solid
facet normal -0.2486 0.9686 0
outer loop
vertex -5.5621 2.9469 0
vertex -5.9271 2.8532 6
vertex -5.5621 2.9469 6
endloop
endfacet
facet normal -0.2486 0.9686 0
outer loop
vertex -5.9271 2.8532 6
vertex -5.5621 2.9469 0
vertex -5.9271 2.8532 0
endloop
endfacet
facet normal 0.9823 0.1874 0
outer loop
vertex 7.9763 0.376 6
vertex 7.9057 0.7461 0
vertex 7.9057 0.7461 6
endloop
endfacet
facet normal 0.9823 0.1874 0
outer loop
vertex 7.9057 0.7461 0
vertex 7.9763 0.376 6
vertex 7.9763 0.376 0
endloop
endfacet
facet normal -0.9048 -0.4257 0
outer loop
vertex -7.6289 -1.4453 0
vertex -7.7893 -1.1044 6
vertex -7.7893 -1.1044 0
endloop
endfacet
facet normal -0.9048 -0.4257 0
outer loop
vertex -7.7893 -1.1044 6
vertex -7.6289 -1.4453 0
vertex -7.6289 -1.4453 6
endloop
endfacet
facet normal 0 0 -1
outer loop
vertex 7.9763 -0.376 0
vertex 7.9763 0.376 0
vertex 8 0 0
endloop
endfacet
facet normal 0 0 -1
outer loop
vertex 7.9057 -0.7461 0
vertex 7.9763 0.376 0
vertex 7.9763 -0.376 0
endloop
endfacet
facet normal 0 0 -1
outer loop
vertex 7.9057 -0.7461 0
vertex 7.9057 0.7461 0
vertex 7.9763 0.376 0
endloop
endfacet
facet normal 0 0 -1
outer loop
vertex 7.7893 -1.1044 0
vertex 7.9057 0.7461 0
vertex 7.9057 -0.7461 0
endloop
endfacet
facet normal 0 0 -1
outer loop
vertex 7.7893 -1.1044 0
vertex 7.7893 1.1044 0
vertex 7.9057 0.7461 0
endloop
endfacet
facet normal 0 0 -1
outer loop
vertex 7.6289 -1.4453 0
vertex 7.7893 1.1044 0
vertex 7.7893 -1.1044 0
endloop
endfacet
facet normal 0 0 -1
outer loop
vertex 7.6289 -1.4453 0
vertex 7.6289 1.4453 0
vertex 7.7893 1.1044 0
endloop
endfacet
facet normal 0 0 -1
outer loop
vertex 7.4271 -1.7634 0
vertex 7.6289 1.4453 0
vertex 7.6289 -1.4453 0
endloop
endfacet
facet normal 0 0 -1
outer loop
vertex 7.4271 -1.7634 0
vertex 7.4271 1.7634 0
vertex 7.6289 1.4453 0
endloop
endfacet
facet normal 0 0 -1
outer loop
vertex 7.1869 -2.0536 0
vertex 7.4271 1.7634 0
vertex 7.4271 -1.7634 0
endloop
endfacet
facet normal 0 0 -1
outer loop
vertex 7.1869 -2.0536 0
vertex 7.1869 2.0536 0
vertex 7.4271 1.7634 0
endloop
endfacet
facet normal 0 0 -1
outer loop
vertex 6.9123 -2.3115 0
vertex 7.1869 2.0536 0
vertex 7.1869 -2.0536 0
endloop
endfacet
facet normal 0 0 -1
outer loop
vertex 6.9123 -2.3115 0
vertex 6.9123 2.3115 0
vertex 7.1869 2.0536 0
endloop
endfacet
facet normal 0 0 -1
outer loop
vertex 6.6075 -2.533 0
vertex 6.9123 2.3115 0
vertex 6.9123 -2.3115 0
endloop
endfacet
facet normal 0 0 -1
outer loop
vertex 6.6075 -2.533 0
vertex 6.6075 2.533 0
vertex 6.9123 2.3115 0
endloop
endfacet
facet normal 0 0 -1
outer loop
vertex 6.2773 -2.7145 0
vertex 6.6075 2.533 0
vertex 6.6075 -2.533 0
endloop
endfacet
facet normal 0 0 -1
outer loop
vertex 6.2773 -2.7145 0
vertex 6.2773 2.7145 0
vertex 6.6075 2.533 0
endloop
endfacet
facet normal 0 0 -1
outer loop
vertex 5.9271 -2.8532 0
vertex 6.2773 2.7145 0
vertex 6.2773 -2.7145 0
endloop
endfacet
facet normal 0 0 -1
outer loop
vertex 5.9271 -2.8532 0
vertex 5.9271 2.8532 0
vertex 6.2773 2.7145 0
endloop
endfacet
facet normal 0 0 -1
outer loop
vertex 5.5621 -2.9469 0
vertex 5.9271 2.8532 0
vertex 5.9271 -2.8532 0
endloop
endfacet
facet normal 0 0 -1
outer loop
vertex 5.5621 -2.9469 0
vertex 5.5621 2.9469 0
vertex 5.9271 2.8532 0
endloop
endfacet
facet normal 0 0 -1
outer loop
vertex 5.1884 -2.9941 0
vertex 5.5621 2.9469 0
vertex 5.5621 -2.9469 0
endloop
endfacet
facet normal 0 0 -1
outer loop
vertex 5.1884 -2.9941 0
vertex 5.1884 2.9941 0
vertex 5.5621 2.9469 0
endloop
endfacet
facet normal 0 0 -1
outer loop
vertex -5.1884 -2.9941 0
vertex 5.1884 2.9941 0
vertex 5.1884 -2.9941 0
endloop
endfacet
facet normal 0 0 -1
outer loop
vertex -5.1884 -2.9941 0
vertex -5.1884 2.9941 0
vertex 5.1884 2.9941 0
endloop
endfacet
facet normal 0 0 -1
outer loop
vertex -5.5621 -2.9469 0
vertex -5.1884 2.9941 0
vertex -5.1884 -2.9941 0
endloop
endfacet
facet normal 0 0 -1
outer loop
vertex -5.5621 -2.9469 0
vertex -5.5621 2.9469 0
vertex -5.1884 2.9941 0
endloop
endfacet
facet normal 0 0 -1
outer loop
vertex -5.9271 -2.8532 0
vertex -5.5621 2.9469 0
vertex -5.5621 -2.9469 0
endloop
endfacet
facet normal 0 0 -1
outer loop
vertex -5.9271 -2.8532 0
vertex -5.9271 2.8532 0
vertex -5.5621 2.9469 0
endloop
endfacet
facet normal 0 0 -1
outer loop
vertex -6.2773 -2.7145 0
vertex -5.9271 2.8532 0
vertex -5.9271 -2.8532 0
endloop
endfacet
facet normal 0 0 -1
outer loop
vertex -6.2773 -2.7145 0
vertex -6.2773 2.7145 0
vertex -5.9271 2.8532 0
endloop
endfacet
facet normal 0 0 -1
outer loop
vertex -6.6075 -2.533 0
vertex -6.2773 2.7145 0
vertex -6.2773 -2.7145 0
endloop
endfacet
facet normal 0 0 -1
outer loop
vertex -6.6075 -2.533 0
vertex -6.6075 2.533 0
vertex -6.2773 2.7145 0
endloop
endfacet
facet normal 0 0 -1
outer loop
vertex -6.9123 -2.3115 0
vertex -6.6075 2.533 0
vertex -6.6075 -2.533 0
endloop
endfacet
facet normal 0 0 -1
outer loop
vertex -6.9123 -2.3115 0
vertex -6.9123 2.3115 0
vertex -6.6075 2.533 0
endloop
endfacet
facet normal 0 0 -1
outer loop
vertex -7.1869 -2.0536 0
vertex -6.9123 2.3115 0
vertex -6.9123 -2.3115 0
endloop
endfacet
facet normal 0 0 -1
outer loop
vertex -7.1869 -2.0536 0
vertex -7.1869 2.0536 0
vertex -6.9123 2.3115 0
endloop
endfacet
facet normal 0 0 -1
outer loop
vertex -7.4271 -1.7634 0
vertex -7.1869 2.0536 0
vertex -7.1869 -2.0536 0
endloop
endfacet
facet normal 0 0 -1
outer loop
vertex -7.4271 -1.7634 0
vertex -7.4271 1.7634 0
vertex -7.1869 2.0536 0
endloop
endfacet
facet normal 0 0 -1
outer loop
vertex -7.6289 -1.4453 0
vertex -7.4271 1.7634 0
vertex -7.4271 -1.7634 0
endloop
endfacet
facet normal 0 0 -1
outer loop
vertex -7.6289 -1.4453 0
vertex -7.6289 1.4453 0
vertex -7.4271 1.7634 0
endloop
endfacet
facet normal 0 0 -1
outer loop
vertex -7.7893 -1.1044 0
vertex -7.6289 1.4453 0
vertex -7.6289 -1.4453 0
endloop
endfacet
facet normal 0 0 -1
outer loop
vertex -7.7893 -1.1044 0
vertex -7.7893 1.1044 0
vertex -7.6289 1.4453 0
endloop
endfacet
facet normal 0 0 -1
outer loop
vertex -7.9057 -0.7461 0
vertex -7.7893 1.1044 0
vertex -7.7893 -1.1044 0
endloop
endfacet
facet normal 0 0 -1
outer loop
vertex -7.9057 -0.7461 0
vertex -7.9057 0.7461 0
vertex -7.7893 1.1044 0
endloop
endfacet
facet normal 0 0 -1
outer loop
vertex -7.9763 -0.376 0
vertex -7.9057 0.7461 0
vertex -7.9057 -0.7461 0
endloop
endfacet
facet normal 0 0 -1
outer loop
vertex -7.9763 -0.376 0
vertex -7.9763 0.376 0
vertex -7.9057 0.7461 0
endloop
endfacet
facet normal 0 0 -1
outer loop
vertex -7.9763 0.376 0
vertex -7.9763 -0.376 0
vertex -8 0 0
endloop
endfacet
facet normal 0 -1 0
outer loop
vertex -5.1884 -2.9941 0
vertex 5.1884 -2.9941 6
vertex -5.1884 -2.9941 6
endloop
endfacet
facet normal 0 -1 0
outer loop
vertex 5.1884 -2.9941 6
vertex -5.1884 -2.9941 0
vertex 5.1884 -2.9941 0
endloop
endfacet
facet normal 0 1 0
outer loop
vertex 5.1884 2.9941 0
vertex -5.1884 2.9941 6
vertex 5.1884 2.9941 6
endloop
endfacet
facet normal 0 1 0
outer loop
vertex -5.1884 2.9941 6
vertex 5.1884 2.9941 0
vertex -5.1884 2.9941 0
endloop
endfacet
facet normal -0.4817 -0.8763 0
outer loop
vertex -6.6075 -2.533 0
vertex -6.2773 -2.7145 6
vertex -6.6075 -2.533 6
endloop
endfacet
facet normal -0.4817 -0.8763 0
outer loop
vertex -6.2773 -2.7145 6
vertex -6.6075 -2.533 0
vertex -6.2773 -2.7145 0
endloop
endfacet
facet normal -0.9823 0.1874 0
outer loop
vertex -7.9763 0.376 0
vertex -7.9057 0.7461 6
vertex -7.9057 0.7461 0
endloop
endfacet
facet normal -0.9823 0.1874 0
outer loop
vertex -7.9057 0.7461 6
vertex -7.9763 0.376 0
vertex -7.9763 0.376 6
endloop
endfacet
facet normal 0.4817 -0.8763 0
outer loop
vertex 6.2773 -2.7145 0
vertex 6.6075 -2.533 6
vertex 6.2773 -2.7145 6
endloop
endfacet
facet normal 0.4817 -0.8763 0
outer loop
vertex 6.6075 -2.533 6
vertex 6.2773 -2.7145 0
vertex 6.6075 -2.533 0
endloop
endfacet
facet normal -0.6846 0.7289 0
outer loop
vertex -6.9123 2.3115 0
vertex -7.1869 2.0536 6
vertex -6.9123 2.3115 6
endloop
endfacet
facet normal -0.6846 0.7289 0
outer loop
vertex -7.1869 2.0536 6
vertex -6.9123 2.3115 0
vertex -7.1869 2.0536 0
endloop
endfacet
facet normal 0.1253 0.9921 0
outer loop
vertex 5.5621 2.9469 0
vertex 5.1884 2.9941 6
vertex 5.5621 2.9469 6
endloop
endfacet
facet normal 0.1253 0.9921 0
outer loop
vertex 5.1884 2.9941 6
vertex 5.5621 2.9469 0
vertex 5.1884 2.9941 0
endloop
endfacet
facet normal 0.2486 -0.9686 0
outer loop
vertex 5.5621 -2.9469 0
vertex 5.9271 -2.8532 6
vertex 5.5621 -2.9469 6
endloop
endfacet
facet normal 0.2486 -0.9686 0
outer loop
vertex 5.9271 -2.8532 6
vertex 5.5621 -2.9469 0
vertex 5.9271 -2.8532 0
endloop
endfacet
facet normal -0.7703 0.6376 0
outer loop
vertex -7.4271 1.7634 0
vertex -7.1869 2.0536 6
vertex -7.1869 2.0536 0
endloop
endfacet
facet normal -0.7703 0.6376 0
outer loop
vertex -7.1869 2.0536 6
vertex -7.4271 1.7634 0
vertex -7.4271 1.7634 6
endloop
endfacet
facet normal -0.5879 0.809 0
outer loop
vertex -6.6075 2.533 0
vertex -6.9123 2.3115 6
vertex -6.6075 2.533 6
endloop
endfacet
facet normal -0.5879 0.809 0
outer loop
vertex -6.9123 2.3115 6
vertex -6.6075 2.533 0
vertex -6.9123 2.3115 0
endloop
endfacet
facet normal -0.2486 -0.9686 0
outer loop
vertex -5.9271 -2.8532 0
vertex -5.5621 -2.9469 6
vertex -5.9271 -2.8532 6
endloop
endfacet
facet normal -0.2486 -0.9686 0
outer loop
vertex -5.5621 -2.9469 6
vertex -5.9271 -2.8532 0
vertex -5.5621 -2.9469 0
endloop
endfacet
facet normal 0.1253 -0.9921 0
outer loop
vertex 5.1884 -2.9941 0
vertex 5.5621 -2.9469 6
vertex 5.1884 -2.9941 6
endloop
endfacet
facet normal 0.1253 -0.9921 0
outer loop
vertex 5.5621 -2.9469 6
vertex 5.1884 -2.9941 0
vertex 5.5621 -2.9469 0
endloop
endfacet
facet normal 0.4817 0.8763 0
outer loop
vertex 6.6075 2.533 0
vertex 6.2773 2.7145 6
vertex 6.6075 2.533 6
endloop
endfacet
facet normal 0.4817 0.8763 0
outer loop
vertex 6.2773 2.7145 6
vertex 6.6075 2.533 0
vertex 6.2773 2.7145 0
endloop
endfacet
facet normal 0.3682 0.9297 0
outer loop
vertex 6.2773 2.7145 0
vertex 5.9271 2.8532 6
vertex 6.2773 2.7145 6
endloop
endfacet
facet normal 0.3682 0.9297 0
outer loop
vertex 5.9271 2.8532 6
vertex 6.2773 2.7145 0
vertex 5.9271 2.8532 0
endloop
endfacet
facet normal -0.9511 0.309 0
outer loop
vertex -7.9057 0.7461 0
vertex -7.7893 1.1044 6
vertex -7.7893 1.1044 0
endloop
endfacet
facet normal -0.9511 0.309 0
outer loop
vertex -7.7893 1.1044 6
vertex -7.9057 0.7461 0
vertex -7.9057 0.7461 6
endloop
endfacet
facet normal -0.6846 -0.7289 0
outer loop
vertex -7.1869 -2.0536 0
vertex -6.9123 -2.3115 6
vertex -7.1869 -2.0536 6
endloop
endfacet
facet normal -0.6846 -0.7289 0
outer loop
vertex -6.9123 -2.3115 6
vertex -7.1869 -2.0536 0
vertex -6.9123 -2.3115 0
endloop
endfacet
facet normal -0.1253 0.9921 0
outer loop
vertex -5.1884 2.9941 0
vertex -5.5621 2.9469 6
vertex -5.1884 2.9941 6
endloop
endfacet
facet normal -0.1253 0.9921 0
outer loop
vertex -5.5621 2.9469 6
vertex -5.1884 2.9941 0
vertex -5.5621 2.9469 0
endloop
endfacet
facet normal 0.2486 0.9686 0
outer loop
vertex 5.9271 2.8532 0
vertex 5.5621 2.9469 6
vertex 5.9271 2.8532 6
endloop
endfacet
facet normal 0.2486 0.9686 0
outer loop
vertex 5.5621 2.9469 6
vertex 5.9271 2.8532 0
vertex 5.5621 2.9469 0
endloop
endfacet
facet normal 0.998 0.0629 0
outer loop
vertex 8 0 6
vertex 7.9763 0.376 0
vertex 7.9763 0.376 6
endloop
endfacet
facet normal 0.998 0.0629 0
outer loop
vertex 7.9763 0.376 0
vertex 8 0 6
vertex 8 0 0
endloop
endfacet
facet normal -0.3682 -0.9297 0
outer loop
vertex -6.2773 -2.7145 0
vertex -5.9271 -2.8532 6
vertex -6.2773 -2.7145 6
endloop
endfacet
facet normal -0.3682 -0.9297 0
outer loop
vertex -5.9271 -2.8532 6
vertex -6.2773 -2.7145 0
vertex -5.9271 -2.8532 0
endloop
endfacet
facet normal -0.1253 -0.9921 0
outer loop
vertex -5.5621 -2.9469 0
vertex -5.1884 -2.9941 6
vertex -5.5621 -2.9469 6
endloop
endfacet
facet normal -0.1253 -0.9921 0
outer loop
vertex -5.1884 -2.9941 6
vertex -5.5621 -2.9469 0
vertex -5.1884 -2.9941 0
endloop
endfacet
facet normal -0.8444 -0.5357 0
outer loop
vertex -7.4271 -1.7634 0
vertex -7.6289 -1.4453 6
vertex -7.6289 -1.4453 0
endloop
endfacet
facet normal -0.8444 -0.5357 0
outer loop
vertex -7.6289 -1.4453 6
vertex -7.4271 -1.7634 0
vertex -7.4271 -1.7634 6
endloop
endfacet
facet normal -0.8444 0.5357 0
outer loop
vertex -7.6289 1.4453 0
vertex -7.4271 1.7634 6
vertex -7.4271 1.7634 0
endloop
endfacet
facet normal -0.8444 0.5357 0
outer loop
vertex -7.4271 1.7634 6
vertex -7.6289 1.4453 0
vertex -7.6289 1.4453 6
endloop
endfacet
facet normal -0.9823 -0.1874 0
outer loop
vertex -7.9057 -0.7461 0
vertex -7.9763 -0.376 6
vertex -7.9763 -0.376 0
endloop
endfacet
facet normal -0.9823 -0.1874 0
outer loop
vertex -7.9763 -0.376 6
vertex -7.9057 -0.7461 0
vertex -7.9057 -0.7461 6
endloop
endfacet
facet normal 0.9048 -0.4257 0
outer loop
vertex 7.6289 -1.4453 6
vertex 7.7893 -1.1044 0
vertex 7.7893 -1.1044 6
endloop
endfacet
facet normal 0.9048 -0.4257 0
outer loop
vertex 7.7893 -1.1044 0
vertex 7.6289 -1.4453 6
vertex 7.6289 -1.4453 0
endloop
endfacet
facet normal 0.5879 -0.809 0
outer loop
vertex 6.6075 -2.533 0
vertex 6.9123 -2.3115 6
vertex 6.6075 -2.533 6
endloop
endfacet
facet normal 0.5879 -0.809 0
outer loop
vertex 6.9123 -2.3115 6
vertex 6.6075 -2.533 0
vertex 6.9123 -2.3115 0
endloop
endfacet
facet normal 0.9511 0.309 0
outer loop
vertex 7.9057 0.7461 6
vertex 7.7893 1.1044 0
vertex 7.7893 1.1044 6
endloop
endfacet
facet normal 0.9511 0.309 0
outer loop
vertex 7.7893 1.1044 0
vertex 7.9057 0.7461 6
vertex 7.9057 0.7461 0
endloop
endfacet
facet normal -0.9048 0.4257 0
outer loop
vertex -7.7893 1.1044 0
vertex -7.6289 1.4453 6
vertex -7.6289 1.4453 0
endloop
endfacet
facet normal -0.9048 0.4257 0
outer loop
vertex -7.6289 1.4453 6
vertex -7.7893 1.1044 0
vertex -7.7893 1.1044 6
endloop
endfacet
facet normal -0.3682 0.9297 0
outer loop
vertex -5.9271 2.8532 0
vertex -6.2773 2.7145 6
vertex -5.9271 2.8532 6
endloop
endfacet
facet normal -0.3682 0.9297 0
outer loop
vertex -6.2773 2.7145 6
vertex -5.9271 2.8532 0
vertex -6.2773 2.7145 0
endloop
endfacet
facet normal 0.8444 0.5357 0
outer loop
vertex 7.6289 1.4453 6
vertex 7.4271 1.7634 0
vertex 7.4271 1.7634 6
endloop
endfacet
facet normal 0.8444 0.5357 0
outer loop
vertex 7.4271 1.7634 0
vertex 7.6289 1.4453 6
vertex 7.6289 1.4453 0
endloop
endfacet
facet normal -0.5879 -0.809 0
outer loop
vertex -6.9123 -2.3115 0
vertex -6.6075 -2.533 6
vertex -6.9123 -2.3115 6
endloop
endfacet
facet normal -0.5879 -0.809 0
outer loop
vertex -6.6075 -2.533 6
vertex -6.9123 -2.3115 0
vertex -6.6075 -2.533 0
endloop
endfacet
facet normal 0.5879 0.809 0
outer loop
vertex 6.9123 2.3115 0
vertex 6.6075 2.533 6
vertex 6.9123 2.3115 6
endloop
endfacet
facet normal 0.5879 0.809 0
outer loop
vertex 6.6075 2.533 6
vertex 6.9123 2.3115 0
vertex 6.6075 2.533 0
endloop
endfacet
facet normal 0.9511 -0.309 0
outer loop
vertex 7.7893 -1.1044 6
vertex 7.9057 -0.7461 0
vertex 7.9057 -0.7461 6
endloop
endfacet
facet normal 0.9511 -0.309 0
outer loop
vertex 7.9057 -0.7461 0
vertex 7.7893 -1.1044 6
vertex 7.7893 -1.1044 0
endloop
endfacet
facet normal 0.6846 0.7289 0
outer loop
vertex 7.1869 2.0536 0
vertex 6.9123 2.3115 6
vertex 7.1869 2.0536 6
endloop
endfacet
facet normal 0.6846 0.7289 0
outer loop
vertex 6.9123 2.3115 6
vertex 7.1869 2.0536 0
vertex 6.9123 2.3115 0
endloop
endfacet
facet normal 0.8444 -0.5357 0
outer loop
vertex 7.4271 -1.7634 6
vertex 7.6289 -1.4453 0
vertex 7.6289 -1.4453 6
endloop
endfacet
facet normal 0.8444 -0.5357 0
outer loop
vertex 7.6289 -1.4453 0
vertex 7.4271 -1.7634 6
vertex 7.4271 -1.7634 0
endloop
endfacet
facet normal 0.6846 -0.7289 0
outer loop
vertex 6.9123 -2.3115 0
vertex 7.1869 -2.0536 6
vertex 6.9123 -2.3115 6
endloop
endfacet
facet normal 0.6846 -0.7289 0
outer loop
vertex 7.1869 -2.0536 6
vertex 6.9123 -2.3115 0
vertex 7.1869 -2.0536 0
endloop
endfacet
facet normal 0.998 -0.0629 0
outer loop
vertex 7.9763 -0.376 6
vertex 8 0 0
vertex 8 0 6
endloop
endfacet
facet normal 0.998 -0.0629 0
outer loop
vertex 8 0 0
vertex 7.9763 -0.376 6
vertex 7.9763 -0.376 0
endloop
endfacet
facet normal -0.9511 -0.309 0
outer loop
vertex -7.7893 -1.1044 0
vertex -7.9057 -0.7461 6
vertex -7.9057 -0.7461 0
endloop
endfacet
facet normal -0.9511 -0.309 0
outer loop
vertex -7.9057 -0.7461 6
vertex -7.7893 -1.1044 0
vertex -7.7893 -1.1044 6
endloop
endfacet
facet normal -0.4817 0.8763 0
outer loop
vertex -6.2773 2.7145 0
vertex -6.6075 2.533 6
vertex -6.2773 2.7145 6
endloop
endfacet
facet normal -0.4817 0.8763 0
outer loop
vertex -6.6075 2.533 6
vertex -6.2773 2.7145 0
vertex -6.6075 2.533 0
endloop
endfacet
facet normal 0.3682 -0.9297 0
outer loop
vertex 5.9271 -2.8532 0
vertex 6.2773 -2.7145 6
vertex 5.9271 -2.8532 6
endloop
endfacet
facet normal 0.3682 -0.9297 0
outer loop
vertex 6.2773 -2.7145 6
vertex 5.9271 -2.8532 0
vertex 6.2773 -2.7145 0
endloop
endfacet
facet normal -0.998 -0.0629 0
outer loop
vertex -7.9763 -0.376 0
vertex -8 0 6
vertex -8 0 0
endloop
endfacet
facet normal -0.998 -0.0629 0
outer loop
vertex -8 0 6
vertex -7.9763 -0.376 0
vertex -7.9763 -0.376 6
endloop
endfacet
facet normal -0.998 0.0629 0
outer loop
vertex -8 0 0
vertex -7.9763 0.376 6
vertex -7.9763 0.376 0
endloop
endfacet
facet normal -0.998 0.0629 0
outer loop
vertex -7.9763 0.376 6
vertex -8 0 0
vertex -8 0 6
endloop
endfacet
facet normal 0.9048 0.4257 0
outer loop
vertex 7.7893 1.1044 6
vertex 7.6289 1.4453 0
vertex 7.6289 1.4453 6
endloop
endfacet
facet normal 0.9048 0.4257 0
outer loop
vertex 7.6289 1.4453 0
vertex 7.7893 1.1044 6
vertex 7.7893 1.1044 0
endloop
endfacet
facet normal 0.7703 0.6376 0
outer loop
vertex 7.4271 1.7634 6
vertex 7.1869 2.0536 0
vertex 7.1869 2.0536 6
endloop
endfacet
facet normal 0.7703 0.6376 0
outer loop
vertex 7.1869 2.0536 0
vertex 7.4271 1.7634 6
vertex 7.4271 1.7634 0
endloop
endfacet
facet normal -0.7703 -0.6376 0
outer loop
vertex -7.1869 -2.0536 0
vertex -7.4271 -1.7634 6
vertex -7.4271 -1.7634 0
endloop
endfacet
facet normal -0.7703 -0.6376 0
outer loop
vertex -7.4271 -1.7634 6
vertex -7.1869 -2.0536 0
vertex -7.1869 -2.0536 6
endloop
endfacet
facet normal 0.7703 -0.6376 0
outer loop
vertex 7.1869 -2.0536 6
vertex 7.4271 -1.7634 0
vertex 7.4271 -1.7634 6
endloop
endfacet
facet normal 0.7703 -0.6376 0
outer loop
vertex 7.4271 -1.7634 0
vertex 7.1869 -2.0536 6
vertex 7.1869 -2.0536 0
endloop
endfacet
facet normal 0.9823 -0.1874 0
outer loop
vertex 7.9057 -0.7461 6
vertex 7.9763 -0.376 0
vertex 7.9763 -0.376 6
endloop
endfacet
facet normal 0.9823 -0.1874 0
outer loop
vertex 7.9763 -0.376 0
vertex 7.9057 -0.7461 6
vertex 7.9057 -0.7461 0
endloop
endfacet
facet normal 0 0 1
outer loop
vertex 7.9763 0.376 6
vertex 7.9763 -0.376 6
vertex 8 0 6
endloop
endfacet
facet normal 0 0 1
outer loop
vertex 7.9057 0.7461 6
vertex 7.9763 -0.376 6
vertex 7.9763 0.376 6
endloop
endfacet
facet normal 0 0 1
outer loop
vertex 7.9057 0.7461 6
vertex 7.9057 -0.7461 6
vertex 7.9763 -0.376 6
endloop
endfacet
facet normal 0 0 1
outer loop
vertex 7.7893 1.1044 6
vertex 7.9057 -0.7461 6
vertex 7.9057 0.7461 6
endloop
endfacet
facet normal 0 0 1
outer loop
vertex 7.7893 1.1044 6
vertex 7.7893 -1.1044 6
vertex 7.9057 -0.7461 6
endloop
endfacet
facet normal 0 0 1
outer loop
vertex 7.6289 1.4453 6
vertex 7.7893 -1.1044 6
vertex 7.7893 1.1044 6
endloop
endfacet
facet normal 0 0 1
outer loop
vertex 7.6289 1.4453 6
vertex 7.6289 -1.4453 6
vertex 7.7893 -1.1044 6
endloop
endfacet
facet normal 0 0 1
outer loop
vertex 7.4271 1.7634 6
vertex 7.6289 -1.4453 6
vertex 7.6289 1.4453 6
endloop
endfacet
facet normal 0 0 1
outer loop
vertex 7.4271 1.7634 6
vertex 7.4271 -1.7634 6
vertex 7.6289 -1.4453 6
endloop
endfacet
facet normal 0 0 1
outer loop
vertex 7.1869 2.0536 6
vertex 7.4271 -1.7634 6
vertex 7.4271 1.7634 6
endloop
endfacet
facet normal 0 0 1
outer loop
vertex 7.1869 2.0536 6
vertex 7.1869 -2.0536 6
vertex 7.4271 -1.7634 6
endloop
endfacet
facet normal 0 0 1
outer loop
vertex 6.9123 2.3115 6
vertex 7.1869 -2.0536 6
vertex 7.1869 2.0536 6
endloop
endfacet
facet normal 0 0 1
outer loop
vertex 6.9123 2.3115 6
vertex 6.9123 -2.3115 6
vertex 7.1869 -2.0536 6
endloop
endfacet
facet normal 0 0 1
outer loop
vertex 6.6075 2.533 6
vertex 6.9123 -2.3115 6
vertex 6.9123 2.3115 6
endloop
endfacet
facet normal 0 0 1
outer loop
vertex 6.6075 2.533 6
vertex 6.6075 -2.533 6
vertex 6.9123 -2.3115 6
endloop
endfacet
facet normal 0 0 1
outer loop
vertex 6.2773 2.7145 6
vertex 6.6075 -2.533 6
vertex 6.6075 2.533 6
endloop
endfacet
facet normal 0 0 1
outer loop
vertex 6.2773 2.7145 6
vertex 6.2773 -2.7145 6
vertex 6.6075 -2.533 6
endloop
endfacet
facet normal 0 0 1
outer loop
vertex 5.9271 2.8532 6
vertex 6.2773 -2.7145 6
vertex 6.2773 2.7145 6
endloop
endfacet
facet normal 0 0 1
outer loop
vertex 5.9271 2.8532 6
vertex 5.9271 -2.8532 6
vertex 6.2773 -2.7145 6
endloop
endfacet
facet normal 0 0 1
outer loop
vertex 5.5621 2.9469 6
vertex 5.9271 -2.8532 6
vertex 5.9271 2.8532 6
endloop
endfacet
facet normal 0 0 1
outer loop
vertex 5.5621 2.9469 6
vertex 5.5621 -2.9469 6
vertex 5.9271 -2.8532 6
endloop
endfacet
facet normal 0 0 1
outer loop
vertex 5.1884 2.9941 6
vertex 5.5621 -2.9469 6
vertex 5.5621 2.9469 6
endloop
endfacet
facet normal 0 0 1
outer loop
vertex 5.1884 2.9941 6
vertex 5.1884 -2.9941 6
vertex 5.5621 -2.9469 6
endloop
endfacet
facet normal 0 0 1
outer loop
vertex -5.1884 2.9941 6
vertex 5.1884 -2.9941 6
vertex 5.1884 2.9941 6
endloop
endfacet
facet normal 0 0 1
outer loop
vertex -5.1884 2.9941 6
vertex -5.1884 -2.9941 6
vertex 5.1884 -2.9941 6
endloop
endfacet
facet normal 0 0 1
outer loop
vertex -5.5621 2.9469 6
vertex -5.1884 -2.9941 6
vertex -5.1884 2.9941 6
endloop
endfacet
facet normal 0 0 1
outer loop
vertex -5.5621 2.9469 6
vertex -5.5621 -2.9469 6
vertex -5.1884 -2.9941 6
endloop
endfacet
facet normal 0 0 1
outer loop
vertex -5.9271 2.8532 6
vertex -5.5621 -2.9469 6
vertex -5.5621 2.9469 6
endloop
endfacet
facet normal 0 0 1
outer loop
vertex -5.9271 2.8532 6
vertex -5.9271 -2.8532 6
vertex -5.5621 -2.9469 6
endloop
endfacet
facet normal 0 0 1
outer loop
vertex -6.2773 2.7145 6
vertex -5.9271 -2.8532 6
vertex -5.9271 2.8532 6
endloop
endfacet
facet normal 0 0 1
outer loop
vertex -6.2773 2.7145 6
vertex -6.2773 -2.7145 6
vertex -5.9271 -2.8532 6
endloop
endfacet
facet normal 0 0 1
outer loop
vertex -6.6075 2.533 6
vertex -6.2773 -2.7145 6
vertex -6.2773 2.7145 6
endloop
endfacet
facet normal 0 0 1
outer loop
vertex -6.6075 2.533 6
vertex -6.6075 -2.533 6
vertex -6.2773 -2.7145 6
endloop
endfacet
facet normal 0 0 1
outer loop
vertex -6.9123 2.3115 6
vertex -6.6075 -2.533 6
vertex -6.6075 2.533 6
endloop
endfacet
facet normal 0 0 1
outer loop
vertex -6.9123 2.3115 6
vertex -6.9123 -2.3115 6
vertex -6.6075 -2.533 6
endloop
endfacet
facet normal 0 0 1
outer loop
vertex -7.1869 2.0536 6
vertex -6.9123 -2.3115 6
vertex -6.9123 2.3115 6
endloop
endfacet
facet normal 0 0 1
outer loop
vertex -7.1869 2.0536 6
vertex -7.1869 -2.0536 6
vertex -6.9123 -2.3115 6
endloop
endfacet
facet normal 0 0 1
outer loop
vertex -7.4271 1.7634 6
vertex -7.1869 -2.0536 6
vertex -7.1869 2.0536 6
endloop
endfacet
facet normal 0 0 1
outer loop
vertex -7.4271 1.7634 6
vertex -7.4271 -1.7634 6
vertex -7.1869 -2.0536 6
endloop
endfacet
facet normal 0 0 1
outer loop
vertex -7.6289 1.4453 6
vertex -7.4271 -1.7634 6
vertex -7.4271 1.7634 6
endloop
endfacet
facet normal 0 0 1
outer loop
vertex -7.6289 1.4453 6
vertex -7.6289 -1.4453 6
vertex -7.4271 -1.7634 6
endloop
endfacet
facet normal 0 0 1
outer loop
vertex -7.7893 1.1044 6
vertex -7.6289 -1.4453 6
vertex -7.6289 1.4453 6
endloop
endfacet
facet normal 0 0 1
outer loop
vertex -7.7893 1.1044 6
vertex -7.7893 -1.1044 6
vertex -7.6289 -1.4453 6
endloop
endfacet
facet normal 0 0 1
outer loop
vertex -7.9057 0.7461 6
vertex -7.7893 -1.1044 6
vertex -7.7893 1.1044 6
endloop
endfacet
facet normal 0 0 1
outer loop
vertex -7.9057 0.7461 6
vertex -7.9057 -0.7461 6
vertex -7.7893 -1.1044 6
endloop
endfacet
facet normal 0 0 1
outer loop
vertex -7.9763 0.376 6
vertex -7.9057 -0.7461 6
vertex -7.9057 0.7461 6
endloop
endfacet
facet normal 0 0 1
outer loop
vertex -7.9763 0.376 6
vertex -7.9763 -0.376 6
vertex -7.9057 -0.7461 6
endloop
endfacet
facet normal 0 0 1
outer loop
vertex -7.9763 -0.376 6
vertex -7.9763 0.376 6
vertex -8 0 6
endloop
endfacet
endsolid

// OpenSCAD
$fn = 50;

difference() {
	union() {
		hull() {
			translate(v = [5.0, 0, 0]) {
				cylinder(h = 6, r = 3);
			}
			translate(v = [-5.0, 0, 0]) {
				cylinder(h = 6, r = 3);
			}
		}
	}
	union();
}
